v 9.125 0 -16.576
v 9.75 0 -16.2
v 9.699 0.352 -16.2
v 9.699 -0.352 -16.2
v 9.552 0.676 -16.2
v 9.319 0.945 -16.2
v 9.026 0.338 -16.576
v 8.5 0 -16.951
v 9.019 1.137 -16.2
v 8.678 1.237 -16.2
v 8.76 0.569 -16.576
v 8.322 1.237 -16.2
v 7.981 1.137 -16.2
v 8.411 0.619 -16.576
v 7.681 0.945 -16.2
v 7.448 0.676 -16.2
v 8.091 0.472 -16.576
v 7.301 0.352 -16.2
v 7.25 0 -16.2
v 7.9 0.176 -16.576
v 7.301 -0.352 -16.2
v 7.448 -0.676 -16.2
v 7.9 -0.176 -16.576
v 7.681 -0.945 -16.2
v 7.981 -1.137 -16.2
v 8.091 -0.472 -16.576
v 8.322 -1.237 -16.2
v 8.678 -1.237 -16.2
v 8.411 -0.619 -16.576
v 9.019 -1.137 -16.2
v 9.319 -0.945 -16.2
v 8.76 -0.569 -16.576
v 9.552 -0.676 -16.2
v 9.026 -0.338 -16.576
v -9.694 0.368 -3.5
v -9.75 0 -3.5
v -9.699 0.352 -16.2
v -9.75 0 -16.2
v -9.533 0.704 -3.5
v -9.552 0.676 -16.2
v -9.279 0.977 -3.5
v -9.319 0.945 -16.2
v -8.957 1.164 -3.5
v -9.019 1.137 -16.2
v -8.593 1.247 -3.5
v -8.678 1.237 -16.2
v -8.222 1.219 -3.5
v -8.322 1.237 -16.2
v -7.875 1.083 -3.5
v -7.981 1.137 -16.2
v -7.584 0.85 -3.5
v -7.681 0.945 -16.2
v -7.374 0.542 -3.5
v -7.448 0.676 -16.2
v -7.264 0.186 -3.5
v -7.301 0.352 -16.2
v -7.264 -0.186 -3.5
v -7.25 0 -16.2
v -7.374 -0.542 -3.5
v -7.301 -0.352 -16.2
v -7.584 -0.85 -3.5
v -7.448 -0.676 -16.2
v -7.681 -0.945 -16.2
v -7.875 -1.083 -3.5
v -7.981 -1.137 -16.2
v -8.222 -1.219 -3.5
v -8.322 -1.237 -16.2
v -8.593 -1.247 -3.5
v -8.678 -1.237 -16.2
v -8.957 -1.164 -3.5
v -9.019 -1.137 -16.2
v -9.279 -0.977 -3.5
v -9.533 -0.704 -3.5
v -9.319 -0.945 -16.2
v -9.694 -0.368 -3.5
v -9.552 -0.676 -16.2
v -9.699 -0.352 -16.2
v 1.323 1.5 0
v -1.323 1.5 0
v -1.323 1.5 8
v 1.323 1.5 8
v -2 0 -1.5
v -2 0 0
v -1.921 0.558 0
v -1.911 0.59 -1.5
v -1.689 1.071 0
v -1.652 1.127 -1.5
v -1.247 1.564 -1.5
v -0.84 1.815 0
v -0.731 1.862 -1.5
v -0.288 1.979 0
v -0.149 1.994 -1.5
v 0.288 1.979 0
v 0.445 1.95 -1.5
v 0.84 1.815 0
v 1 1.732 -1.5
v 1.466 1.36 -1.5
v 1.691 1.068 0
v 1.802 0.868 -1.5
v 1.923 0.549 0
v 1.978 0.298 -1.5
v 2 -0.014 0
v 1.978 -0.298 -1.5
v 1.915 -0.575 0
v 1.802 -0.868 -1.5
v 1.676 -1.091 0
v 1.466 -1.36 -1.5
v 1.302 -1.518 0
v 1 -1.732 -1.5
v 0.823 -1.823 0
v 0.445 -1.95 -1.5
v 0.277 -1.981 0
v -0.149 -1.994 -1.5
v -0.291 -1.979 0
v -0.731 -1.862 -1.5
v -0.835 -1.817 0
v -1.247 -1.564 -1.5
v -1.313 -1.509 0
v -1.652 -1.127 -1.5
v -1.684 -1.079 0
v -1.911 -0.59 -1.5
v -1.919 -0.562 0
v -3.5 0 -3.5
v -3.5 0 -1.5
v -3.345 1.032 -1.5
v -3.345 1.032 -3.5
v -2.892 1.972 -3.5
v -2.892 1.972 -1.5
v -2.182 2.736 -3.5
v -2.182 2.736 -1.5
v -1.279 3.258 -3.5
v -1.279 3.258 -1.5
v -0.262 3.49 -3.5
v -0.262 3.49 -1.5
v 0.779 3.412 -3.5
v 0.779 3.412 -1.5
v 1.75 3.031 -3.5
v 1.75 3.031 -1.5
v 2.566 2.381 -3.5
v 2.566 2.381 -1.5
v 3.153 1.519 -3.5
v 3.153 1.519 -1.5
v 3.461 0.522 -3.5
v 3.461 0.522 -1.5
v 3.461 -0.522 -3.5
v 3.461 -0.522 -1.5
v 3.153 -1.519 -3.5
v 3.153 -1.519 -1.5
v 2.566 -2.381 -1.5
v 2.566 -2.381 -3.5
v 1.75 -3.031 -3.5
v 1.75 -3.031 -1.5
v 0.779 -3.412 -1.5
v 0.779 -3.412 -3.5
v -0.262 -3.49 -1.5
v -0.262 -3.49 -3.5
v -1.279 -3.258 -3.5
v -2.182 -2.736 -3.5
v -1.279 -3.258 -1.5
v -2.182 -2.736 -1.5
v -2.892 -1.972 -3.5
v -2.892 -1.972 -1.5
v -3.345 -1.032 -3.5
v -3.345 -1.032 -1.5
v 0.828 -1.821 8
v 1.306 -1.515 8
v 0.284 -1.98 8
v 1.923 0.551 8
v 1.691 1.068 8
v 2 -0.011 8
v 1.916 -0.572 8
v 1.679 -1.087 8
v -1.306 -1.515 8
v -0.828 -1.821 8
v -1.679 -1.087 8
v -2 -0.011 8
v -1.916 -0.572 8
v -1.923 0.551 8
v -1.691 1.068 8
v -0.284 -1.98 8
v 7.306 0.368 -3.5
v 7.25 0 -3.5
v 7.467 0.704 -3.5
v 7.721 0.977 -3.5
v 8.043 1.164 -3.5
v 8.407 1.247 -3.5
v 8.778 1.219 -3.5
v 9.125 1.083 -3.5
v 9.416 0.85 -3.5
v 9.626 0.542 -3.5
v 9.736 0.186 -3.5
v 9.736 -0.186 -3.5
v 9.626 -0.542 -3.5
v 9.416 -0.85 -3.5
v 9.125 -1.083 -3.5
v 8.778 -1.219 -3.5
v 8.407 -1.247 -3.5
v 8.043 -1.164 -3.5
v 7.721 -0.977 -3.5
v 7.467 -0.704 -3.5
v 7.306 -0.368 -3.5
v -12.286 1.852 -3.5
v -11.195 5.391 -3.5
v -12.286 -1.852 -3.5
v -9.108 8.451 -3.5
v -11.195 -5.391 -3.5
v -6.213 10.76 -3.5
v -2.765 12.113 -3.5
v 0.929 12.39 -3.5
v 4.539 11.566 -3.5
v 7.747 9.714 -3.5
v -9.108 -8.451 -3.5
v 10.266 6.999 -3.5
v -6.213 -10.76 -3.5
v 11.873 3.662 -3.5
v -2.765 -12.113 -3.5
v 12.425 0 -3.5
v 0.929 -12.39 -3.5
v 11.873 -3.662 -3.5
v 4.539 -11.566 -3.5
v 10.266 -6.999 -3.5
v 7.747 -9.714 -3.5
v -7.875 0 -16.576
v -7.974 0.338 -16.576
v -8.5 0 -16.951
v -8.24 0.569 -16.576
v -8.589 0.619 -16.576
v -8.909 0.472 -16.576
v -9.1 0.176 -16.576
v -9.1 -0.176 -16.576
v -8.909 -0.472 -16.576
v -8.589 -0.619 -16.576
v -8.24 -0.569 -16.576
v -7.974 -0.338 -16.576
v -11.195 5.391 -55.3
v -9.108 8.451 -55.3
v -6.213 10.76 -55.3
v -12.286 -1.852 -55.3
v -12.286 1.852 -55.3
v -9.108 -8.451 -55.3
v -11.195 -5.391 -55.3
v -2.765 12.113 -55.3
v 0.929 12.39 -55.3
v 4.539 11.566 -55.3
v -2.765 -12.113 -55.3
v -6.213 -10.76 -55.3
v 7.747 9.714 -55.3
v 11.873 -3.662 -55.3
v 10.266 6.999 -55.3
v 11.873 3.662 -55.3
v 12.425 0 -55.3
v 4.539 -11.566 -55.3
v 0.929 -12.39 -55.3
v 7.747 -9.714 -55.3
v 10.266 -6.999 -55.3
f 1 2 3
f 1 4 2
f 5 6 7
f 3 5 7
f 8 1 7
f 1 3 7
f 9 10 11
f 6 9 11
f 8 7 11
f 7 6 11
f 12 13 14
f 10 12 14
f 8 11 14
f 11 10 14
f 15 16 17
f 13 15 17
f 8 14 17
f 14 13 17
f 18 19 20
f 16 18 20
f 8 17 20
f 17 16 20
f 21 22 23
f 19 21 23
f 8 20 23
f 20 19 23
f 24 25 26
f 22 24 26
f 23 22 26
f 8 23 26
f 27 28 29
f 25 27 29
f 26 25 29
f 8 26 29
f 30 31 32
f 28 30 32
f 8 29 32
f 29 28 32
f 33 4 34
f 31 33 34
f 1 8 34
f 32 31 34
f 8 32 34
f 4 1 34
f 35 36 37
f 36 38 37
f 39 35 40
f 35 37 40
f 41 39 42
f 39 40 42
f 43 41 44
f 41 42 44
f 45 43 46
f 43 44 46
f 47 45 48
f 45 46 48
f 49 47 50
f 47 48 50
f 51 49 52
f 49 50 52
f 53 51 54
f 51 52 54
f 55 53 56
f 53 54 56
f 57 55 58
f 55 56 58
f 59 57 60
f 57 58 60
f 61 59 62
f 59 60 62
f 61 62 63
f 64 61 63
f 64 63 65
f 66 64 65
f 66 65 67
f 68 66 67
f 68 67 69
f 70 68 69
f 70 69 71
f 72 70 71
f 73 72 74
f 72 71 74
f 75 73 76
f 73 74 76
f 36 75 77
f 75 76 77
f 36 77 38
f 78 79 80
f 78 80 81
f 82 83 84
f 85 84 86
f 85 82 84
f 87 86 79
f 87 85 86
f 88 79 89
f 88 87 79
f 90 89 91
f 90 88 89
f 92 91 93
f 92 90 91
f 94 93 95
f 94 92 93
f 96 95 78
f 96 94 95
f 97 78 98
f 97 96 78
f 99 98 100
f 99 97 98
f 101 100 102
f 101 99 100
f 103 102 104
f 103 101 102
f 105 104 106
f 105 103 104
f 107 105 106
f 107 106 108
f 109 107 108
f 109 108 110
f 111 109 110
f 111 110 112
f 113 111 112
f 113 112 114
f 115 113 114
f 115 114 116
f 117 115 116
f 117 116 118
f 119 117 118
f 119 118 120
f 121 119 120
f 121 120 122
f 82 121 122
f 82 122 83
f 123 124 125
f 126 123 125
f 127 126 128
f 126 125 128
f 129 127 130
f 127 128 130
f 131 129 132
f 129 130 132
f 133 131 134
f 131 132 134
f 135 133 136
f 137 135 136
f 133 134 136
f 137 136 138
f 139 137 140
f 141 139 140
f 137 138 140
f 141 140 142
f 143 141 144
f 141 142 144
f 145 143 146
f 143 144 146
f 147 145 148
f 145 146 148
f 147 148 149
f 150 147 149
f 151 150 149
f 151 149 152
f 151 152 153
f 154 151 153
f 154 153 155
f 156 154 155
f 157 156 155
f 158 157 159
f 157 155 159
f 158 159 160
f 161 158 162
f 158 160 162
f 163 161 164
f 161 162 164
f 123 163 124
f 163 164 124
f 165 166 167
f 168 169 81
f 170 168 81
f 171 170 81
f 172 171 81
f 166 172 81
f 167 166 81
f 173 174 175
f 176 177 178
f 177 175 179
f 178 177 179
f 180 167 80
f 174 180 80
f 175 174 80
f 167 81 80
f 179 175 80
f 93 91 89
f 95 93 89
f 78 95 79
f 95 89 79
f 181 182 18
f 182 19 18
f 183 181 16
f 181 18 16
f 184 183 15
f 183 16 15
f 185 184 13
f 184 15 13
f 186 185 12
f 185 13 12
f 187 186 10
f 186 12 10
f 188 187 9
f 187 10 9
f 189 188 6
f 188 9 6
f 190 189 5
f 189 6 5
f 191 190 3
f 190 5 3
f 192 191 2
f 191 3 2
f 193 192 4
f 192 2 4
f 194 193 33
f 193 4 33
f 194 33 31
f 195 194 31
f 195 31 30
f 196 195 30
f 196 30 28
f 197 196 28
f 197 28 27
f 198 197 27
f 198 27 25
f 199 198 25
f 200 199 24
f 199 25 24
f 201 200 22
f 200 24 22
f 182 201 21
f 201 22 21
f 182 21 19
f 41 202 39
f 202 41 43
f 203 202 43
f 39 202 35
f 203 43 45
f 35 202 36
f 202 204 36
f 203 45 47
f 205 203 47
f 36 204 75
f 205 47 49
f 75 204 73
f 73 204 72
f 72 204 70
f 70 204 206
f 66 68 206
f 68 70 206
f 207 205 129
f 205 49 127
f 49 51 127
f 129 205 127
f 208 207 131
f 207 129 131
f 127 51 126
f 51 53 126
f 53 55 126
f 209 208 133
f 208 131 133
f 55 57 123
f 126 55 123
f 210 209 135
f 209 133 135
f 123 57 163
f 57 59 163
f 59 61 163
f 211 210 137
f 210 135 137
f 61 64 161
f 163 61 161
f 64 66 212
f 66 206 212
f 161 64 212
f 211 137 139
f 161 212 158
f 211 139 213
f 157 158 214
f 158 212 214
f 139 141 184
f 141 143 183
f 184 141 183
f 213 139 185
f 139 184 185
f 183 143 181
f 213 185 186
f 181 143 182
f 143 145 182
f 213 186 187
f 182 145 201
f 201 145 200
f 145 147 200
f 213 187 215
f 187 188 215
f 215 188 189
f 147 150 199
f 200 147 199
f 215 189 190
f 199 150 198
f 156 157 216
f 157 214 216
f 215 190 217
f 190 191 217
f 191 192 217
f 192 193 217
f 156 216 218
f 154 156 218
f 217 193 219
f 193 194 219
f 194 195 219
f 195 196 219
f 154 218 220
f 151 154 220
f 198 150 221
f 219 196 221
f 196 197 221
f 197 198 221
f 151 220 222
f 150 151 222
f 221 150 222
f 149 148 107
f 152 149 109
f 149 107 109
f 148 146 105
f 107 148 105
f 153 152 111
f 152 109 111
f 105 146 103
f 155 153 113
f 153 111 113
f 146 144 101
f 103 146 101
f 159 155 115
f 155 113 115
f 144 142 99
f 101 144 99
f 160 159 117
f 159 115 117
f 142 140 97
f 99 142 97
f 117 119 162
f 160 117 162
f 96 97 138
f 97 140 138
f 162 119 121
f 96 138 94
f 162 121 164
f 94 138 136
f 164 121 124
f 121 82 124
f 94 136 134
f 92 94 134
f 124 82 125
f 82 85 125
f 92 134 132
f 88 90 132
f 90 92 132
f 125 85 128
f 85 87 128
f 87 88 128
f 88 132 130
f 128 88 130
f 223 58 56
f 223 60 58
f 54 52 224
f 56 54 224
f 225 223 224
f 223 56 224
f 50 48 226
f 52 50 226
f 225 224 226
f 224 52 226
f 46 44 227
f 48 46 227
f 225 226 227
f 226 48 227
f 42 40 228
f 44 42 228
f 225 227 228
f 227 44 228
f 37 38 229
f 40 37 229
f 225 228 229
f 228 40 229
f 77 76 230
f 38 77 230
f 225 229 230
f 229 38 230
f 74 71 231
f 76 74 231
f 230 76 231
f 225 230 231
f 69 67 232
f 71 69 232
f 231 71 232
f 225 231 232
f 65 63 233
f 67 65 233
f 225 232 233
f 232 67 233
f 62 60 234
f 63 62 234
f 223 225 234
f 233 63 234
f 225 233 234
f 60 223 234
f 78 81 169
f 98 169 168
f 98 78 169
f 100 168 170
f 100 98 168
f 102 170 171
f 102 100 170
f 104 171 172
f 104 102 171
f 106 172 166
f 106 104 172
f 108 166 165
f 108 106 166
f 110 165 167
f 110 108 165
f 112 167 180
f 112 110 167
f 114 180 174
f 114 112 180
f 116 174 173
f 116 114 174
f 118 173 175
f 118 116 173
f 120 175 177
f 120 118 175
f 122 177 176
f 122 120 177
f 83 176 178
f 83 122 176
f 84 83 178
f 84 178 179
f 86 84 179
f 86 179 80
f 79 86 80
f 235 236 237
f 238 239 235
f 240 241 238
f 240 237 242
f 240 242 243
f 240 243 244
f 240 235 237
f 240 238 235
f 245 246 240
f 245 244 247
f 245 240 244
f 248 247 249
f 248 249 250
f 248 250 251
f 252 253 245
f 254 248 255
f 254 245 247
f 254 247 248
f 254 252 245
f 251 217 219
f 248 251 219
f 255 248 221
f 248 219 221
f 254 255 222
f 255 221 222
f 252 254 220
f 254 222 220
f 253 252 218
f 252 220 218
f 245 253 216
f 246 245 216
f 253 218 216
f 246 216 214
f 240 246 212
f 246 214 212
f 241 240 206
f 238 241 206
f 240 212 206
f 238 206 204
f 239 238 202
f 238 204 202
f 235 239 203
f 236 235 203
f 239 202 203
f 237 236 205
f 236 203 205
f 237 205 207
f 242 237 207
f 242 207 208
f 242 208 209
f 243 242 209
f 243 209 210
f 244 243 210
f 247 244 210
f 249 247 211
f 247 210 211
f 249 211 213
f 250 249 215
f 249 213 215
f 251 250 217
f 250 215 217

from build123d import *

# Parameters (mm, degrees)
BOSS_EXTRUDE1_DEPTH   = 8
BOSS_EXTRUDE2_START   = 1.5
SKETCH2_R             = 2
BOSS_EXTRUDE2_DEPTH   = 1.5
SKETCH3_R             = 3.5
BOSS_EXTRUDE3_DEPTH   = 2
SKETCH4_R             = 12.425
BOSS_EXTRUDE4_DEPTH   = 51.8
M3_TAPPED_HOLE1_D     = 2.5
M3_TAPPED_HOLE1_DEPTH = 12.7
M3_TAPPED_HOLE1_TIP   = 0.751075774


with BuildPart() as part:
    # Sketch1 → Boss-Extrude1 (new body)
    with BuildSketch(Plane.XY):
        with BuildLine():
            Line((-1.322875656, 1.5), (1.322875656, 1.5))
            ThreePointArc((1.322875656, 1.5), (0, -2), (-1.322875656, 1.5))
        make_face()
    extrude(amount=BOSS_EXTRUDE1_DEPTH)

    # Sketch2 → Boss-Extrude2 (add)
    with BuildSketch(Plane(origin=(0, 0, 0), x_dir=(-1, 0, 0), z_dir=(0, 0, -1)).offset(BOSS_EXTRUDE2_START)):
        Circle(SKETCH2_R)
    extrude(amount=-BOSS_EXTRUDE2_DEPTH)

    # Sketch3 → Boss-Extrude3 (add)
    with BuildSketch(Plane(origin=(0, 0, -1.5), x_dir=(-1, 0, 0), z_dir=(0, 0, -1))):
        Circle(SKETCH3_R)
    extrude(amount=BOSS_EXTRUDE3_DEPTH)

    # Sketch4 → Boss-Extrude4 (add)
    with BuildSketch(Plane(origin=(0, 0, -3.5), x_dir=(-1, 0, 0), z_dir=(0, 0, -1))):
        with Locations(Location((0, 0, 0), (0, 0, 180))):
            Circle(SKETCH4_R)
    extrude(amount=BOSS_EXTRUDE4_DEPTH)

    # M3 Tapped Hole1
    with Locations(Plane.XY.offset(-3.5)):
        with Locations((8.5, 0), (-8.5, 0)):
            Hole(M3_TAPPED_HOLE1_D / 2, depth=M3_TAPPED_HOLE1_DEPTH)
            with Locations((0, 0, -(M3_TAPPED_HOLE1_DEPTH + M3_TAPPED_HOLE1_TIP / 2))):  # 118° drill point
                Cone(0, M3_TAPPED_HOLE1_D / 2, M3_TAPPED_HOLE1_TIP, mode=Mode.SUBTRACT)


solid = part.part
